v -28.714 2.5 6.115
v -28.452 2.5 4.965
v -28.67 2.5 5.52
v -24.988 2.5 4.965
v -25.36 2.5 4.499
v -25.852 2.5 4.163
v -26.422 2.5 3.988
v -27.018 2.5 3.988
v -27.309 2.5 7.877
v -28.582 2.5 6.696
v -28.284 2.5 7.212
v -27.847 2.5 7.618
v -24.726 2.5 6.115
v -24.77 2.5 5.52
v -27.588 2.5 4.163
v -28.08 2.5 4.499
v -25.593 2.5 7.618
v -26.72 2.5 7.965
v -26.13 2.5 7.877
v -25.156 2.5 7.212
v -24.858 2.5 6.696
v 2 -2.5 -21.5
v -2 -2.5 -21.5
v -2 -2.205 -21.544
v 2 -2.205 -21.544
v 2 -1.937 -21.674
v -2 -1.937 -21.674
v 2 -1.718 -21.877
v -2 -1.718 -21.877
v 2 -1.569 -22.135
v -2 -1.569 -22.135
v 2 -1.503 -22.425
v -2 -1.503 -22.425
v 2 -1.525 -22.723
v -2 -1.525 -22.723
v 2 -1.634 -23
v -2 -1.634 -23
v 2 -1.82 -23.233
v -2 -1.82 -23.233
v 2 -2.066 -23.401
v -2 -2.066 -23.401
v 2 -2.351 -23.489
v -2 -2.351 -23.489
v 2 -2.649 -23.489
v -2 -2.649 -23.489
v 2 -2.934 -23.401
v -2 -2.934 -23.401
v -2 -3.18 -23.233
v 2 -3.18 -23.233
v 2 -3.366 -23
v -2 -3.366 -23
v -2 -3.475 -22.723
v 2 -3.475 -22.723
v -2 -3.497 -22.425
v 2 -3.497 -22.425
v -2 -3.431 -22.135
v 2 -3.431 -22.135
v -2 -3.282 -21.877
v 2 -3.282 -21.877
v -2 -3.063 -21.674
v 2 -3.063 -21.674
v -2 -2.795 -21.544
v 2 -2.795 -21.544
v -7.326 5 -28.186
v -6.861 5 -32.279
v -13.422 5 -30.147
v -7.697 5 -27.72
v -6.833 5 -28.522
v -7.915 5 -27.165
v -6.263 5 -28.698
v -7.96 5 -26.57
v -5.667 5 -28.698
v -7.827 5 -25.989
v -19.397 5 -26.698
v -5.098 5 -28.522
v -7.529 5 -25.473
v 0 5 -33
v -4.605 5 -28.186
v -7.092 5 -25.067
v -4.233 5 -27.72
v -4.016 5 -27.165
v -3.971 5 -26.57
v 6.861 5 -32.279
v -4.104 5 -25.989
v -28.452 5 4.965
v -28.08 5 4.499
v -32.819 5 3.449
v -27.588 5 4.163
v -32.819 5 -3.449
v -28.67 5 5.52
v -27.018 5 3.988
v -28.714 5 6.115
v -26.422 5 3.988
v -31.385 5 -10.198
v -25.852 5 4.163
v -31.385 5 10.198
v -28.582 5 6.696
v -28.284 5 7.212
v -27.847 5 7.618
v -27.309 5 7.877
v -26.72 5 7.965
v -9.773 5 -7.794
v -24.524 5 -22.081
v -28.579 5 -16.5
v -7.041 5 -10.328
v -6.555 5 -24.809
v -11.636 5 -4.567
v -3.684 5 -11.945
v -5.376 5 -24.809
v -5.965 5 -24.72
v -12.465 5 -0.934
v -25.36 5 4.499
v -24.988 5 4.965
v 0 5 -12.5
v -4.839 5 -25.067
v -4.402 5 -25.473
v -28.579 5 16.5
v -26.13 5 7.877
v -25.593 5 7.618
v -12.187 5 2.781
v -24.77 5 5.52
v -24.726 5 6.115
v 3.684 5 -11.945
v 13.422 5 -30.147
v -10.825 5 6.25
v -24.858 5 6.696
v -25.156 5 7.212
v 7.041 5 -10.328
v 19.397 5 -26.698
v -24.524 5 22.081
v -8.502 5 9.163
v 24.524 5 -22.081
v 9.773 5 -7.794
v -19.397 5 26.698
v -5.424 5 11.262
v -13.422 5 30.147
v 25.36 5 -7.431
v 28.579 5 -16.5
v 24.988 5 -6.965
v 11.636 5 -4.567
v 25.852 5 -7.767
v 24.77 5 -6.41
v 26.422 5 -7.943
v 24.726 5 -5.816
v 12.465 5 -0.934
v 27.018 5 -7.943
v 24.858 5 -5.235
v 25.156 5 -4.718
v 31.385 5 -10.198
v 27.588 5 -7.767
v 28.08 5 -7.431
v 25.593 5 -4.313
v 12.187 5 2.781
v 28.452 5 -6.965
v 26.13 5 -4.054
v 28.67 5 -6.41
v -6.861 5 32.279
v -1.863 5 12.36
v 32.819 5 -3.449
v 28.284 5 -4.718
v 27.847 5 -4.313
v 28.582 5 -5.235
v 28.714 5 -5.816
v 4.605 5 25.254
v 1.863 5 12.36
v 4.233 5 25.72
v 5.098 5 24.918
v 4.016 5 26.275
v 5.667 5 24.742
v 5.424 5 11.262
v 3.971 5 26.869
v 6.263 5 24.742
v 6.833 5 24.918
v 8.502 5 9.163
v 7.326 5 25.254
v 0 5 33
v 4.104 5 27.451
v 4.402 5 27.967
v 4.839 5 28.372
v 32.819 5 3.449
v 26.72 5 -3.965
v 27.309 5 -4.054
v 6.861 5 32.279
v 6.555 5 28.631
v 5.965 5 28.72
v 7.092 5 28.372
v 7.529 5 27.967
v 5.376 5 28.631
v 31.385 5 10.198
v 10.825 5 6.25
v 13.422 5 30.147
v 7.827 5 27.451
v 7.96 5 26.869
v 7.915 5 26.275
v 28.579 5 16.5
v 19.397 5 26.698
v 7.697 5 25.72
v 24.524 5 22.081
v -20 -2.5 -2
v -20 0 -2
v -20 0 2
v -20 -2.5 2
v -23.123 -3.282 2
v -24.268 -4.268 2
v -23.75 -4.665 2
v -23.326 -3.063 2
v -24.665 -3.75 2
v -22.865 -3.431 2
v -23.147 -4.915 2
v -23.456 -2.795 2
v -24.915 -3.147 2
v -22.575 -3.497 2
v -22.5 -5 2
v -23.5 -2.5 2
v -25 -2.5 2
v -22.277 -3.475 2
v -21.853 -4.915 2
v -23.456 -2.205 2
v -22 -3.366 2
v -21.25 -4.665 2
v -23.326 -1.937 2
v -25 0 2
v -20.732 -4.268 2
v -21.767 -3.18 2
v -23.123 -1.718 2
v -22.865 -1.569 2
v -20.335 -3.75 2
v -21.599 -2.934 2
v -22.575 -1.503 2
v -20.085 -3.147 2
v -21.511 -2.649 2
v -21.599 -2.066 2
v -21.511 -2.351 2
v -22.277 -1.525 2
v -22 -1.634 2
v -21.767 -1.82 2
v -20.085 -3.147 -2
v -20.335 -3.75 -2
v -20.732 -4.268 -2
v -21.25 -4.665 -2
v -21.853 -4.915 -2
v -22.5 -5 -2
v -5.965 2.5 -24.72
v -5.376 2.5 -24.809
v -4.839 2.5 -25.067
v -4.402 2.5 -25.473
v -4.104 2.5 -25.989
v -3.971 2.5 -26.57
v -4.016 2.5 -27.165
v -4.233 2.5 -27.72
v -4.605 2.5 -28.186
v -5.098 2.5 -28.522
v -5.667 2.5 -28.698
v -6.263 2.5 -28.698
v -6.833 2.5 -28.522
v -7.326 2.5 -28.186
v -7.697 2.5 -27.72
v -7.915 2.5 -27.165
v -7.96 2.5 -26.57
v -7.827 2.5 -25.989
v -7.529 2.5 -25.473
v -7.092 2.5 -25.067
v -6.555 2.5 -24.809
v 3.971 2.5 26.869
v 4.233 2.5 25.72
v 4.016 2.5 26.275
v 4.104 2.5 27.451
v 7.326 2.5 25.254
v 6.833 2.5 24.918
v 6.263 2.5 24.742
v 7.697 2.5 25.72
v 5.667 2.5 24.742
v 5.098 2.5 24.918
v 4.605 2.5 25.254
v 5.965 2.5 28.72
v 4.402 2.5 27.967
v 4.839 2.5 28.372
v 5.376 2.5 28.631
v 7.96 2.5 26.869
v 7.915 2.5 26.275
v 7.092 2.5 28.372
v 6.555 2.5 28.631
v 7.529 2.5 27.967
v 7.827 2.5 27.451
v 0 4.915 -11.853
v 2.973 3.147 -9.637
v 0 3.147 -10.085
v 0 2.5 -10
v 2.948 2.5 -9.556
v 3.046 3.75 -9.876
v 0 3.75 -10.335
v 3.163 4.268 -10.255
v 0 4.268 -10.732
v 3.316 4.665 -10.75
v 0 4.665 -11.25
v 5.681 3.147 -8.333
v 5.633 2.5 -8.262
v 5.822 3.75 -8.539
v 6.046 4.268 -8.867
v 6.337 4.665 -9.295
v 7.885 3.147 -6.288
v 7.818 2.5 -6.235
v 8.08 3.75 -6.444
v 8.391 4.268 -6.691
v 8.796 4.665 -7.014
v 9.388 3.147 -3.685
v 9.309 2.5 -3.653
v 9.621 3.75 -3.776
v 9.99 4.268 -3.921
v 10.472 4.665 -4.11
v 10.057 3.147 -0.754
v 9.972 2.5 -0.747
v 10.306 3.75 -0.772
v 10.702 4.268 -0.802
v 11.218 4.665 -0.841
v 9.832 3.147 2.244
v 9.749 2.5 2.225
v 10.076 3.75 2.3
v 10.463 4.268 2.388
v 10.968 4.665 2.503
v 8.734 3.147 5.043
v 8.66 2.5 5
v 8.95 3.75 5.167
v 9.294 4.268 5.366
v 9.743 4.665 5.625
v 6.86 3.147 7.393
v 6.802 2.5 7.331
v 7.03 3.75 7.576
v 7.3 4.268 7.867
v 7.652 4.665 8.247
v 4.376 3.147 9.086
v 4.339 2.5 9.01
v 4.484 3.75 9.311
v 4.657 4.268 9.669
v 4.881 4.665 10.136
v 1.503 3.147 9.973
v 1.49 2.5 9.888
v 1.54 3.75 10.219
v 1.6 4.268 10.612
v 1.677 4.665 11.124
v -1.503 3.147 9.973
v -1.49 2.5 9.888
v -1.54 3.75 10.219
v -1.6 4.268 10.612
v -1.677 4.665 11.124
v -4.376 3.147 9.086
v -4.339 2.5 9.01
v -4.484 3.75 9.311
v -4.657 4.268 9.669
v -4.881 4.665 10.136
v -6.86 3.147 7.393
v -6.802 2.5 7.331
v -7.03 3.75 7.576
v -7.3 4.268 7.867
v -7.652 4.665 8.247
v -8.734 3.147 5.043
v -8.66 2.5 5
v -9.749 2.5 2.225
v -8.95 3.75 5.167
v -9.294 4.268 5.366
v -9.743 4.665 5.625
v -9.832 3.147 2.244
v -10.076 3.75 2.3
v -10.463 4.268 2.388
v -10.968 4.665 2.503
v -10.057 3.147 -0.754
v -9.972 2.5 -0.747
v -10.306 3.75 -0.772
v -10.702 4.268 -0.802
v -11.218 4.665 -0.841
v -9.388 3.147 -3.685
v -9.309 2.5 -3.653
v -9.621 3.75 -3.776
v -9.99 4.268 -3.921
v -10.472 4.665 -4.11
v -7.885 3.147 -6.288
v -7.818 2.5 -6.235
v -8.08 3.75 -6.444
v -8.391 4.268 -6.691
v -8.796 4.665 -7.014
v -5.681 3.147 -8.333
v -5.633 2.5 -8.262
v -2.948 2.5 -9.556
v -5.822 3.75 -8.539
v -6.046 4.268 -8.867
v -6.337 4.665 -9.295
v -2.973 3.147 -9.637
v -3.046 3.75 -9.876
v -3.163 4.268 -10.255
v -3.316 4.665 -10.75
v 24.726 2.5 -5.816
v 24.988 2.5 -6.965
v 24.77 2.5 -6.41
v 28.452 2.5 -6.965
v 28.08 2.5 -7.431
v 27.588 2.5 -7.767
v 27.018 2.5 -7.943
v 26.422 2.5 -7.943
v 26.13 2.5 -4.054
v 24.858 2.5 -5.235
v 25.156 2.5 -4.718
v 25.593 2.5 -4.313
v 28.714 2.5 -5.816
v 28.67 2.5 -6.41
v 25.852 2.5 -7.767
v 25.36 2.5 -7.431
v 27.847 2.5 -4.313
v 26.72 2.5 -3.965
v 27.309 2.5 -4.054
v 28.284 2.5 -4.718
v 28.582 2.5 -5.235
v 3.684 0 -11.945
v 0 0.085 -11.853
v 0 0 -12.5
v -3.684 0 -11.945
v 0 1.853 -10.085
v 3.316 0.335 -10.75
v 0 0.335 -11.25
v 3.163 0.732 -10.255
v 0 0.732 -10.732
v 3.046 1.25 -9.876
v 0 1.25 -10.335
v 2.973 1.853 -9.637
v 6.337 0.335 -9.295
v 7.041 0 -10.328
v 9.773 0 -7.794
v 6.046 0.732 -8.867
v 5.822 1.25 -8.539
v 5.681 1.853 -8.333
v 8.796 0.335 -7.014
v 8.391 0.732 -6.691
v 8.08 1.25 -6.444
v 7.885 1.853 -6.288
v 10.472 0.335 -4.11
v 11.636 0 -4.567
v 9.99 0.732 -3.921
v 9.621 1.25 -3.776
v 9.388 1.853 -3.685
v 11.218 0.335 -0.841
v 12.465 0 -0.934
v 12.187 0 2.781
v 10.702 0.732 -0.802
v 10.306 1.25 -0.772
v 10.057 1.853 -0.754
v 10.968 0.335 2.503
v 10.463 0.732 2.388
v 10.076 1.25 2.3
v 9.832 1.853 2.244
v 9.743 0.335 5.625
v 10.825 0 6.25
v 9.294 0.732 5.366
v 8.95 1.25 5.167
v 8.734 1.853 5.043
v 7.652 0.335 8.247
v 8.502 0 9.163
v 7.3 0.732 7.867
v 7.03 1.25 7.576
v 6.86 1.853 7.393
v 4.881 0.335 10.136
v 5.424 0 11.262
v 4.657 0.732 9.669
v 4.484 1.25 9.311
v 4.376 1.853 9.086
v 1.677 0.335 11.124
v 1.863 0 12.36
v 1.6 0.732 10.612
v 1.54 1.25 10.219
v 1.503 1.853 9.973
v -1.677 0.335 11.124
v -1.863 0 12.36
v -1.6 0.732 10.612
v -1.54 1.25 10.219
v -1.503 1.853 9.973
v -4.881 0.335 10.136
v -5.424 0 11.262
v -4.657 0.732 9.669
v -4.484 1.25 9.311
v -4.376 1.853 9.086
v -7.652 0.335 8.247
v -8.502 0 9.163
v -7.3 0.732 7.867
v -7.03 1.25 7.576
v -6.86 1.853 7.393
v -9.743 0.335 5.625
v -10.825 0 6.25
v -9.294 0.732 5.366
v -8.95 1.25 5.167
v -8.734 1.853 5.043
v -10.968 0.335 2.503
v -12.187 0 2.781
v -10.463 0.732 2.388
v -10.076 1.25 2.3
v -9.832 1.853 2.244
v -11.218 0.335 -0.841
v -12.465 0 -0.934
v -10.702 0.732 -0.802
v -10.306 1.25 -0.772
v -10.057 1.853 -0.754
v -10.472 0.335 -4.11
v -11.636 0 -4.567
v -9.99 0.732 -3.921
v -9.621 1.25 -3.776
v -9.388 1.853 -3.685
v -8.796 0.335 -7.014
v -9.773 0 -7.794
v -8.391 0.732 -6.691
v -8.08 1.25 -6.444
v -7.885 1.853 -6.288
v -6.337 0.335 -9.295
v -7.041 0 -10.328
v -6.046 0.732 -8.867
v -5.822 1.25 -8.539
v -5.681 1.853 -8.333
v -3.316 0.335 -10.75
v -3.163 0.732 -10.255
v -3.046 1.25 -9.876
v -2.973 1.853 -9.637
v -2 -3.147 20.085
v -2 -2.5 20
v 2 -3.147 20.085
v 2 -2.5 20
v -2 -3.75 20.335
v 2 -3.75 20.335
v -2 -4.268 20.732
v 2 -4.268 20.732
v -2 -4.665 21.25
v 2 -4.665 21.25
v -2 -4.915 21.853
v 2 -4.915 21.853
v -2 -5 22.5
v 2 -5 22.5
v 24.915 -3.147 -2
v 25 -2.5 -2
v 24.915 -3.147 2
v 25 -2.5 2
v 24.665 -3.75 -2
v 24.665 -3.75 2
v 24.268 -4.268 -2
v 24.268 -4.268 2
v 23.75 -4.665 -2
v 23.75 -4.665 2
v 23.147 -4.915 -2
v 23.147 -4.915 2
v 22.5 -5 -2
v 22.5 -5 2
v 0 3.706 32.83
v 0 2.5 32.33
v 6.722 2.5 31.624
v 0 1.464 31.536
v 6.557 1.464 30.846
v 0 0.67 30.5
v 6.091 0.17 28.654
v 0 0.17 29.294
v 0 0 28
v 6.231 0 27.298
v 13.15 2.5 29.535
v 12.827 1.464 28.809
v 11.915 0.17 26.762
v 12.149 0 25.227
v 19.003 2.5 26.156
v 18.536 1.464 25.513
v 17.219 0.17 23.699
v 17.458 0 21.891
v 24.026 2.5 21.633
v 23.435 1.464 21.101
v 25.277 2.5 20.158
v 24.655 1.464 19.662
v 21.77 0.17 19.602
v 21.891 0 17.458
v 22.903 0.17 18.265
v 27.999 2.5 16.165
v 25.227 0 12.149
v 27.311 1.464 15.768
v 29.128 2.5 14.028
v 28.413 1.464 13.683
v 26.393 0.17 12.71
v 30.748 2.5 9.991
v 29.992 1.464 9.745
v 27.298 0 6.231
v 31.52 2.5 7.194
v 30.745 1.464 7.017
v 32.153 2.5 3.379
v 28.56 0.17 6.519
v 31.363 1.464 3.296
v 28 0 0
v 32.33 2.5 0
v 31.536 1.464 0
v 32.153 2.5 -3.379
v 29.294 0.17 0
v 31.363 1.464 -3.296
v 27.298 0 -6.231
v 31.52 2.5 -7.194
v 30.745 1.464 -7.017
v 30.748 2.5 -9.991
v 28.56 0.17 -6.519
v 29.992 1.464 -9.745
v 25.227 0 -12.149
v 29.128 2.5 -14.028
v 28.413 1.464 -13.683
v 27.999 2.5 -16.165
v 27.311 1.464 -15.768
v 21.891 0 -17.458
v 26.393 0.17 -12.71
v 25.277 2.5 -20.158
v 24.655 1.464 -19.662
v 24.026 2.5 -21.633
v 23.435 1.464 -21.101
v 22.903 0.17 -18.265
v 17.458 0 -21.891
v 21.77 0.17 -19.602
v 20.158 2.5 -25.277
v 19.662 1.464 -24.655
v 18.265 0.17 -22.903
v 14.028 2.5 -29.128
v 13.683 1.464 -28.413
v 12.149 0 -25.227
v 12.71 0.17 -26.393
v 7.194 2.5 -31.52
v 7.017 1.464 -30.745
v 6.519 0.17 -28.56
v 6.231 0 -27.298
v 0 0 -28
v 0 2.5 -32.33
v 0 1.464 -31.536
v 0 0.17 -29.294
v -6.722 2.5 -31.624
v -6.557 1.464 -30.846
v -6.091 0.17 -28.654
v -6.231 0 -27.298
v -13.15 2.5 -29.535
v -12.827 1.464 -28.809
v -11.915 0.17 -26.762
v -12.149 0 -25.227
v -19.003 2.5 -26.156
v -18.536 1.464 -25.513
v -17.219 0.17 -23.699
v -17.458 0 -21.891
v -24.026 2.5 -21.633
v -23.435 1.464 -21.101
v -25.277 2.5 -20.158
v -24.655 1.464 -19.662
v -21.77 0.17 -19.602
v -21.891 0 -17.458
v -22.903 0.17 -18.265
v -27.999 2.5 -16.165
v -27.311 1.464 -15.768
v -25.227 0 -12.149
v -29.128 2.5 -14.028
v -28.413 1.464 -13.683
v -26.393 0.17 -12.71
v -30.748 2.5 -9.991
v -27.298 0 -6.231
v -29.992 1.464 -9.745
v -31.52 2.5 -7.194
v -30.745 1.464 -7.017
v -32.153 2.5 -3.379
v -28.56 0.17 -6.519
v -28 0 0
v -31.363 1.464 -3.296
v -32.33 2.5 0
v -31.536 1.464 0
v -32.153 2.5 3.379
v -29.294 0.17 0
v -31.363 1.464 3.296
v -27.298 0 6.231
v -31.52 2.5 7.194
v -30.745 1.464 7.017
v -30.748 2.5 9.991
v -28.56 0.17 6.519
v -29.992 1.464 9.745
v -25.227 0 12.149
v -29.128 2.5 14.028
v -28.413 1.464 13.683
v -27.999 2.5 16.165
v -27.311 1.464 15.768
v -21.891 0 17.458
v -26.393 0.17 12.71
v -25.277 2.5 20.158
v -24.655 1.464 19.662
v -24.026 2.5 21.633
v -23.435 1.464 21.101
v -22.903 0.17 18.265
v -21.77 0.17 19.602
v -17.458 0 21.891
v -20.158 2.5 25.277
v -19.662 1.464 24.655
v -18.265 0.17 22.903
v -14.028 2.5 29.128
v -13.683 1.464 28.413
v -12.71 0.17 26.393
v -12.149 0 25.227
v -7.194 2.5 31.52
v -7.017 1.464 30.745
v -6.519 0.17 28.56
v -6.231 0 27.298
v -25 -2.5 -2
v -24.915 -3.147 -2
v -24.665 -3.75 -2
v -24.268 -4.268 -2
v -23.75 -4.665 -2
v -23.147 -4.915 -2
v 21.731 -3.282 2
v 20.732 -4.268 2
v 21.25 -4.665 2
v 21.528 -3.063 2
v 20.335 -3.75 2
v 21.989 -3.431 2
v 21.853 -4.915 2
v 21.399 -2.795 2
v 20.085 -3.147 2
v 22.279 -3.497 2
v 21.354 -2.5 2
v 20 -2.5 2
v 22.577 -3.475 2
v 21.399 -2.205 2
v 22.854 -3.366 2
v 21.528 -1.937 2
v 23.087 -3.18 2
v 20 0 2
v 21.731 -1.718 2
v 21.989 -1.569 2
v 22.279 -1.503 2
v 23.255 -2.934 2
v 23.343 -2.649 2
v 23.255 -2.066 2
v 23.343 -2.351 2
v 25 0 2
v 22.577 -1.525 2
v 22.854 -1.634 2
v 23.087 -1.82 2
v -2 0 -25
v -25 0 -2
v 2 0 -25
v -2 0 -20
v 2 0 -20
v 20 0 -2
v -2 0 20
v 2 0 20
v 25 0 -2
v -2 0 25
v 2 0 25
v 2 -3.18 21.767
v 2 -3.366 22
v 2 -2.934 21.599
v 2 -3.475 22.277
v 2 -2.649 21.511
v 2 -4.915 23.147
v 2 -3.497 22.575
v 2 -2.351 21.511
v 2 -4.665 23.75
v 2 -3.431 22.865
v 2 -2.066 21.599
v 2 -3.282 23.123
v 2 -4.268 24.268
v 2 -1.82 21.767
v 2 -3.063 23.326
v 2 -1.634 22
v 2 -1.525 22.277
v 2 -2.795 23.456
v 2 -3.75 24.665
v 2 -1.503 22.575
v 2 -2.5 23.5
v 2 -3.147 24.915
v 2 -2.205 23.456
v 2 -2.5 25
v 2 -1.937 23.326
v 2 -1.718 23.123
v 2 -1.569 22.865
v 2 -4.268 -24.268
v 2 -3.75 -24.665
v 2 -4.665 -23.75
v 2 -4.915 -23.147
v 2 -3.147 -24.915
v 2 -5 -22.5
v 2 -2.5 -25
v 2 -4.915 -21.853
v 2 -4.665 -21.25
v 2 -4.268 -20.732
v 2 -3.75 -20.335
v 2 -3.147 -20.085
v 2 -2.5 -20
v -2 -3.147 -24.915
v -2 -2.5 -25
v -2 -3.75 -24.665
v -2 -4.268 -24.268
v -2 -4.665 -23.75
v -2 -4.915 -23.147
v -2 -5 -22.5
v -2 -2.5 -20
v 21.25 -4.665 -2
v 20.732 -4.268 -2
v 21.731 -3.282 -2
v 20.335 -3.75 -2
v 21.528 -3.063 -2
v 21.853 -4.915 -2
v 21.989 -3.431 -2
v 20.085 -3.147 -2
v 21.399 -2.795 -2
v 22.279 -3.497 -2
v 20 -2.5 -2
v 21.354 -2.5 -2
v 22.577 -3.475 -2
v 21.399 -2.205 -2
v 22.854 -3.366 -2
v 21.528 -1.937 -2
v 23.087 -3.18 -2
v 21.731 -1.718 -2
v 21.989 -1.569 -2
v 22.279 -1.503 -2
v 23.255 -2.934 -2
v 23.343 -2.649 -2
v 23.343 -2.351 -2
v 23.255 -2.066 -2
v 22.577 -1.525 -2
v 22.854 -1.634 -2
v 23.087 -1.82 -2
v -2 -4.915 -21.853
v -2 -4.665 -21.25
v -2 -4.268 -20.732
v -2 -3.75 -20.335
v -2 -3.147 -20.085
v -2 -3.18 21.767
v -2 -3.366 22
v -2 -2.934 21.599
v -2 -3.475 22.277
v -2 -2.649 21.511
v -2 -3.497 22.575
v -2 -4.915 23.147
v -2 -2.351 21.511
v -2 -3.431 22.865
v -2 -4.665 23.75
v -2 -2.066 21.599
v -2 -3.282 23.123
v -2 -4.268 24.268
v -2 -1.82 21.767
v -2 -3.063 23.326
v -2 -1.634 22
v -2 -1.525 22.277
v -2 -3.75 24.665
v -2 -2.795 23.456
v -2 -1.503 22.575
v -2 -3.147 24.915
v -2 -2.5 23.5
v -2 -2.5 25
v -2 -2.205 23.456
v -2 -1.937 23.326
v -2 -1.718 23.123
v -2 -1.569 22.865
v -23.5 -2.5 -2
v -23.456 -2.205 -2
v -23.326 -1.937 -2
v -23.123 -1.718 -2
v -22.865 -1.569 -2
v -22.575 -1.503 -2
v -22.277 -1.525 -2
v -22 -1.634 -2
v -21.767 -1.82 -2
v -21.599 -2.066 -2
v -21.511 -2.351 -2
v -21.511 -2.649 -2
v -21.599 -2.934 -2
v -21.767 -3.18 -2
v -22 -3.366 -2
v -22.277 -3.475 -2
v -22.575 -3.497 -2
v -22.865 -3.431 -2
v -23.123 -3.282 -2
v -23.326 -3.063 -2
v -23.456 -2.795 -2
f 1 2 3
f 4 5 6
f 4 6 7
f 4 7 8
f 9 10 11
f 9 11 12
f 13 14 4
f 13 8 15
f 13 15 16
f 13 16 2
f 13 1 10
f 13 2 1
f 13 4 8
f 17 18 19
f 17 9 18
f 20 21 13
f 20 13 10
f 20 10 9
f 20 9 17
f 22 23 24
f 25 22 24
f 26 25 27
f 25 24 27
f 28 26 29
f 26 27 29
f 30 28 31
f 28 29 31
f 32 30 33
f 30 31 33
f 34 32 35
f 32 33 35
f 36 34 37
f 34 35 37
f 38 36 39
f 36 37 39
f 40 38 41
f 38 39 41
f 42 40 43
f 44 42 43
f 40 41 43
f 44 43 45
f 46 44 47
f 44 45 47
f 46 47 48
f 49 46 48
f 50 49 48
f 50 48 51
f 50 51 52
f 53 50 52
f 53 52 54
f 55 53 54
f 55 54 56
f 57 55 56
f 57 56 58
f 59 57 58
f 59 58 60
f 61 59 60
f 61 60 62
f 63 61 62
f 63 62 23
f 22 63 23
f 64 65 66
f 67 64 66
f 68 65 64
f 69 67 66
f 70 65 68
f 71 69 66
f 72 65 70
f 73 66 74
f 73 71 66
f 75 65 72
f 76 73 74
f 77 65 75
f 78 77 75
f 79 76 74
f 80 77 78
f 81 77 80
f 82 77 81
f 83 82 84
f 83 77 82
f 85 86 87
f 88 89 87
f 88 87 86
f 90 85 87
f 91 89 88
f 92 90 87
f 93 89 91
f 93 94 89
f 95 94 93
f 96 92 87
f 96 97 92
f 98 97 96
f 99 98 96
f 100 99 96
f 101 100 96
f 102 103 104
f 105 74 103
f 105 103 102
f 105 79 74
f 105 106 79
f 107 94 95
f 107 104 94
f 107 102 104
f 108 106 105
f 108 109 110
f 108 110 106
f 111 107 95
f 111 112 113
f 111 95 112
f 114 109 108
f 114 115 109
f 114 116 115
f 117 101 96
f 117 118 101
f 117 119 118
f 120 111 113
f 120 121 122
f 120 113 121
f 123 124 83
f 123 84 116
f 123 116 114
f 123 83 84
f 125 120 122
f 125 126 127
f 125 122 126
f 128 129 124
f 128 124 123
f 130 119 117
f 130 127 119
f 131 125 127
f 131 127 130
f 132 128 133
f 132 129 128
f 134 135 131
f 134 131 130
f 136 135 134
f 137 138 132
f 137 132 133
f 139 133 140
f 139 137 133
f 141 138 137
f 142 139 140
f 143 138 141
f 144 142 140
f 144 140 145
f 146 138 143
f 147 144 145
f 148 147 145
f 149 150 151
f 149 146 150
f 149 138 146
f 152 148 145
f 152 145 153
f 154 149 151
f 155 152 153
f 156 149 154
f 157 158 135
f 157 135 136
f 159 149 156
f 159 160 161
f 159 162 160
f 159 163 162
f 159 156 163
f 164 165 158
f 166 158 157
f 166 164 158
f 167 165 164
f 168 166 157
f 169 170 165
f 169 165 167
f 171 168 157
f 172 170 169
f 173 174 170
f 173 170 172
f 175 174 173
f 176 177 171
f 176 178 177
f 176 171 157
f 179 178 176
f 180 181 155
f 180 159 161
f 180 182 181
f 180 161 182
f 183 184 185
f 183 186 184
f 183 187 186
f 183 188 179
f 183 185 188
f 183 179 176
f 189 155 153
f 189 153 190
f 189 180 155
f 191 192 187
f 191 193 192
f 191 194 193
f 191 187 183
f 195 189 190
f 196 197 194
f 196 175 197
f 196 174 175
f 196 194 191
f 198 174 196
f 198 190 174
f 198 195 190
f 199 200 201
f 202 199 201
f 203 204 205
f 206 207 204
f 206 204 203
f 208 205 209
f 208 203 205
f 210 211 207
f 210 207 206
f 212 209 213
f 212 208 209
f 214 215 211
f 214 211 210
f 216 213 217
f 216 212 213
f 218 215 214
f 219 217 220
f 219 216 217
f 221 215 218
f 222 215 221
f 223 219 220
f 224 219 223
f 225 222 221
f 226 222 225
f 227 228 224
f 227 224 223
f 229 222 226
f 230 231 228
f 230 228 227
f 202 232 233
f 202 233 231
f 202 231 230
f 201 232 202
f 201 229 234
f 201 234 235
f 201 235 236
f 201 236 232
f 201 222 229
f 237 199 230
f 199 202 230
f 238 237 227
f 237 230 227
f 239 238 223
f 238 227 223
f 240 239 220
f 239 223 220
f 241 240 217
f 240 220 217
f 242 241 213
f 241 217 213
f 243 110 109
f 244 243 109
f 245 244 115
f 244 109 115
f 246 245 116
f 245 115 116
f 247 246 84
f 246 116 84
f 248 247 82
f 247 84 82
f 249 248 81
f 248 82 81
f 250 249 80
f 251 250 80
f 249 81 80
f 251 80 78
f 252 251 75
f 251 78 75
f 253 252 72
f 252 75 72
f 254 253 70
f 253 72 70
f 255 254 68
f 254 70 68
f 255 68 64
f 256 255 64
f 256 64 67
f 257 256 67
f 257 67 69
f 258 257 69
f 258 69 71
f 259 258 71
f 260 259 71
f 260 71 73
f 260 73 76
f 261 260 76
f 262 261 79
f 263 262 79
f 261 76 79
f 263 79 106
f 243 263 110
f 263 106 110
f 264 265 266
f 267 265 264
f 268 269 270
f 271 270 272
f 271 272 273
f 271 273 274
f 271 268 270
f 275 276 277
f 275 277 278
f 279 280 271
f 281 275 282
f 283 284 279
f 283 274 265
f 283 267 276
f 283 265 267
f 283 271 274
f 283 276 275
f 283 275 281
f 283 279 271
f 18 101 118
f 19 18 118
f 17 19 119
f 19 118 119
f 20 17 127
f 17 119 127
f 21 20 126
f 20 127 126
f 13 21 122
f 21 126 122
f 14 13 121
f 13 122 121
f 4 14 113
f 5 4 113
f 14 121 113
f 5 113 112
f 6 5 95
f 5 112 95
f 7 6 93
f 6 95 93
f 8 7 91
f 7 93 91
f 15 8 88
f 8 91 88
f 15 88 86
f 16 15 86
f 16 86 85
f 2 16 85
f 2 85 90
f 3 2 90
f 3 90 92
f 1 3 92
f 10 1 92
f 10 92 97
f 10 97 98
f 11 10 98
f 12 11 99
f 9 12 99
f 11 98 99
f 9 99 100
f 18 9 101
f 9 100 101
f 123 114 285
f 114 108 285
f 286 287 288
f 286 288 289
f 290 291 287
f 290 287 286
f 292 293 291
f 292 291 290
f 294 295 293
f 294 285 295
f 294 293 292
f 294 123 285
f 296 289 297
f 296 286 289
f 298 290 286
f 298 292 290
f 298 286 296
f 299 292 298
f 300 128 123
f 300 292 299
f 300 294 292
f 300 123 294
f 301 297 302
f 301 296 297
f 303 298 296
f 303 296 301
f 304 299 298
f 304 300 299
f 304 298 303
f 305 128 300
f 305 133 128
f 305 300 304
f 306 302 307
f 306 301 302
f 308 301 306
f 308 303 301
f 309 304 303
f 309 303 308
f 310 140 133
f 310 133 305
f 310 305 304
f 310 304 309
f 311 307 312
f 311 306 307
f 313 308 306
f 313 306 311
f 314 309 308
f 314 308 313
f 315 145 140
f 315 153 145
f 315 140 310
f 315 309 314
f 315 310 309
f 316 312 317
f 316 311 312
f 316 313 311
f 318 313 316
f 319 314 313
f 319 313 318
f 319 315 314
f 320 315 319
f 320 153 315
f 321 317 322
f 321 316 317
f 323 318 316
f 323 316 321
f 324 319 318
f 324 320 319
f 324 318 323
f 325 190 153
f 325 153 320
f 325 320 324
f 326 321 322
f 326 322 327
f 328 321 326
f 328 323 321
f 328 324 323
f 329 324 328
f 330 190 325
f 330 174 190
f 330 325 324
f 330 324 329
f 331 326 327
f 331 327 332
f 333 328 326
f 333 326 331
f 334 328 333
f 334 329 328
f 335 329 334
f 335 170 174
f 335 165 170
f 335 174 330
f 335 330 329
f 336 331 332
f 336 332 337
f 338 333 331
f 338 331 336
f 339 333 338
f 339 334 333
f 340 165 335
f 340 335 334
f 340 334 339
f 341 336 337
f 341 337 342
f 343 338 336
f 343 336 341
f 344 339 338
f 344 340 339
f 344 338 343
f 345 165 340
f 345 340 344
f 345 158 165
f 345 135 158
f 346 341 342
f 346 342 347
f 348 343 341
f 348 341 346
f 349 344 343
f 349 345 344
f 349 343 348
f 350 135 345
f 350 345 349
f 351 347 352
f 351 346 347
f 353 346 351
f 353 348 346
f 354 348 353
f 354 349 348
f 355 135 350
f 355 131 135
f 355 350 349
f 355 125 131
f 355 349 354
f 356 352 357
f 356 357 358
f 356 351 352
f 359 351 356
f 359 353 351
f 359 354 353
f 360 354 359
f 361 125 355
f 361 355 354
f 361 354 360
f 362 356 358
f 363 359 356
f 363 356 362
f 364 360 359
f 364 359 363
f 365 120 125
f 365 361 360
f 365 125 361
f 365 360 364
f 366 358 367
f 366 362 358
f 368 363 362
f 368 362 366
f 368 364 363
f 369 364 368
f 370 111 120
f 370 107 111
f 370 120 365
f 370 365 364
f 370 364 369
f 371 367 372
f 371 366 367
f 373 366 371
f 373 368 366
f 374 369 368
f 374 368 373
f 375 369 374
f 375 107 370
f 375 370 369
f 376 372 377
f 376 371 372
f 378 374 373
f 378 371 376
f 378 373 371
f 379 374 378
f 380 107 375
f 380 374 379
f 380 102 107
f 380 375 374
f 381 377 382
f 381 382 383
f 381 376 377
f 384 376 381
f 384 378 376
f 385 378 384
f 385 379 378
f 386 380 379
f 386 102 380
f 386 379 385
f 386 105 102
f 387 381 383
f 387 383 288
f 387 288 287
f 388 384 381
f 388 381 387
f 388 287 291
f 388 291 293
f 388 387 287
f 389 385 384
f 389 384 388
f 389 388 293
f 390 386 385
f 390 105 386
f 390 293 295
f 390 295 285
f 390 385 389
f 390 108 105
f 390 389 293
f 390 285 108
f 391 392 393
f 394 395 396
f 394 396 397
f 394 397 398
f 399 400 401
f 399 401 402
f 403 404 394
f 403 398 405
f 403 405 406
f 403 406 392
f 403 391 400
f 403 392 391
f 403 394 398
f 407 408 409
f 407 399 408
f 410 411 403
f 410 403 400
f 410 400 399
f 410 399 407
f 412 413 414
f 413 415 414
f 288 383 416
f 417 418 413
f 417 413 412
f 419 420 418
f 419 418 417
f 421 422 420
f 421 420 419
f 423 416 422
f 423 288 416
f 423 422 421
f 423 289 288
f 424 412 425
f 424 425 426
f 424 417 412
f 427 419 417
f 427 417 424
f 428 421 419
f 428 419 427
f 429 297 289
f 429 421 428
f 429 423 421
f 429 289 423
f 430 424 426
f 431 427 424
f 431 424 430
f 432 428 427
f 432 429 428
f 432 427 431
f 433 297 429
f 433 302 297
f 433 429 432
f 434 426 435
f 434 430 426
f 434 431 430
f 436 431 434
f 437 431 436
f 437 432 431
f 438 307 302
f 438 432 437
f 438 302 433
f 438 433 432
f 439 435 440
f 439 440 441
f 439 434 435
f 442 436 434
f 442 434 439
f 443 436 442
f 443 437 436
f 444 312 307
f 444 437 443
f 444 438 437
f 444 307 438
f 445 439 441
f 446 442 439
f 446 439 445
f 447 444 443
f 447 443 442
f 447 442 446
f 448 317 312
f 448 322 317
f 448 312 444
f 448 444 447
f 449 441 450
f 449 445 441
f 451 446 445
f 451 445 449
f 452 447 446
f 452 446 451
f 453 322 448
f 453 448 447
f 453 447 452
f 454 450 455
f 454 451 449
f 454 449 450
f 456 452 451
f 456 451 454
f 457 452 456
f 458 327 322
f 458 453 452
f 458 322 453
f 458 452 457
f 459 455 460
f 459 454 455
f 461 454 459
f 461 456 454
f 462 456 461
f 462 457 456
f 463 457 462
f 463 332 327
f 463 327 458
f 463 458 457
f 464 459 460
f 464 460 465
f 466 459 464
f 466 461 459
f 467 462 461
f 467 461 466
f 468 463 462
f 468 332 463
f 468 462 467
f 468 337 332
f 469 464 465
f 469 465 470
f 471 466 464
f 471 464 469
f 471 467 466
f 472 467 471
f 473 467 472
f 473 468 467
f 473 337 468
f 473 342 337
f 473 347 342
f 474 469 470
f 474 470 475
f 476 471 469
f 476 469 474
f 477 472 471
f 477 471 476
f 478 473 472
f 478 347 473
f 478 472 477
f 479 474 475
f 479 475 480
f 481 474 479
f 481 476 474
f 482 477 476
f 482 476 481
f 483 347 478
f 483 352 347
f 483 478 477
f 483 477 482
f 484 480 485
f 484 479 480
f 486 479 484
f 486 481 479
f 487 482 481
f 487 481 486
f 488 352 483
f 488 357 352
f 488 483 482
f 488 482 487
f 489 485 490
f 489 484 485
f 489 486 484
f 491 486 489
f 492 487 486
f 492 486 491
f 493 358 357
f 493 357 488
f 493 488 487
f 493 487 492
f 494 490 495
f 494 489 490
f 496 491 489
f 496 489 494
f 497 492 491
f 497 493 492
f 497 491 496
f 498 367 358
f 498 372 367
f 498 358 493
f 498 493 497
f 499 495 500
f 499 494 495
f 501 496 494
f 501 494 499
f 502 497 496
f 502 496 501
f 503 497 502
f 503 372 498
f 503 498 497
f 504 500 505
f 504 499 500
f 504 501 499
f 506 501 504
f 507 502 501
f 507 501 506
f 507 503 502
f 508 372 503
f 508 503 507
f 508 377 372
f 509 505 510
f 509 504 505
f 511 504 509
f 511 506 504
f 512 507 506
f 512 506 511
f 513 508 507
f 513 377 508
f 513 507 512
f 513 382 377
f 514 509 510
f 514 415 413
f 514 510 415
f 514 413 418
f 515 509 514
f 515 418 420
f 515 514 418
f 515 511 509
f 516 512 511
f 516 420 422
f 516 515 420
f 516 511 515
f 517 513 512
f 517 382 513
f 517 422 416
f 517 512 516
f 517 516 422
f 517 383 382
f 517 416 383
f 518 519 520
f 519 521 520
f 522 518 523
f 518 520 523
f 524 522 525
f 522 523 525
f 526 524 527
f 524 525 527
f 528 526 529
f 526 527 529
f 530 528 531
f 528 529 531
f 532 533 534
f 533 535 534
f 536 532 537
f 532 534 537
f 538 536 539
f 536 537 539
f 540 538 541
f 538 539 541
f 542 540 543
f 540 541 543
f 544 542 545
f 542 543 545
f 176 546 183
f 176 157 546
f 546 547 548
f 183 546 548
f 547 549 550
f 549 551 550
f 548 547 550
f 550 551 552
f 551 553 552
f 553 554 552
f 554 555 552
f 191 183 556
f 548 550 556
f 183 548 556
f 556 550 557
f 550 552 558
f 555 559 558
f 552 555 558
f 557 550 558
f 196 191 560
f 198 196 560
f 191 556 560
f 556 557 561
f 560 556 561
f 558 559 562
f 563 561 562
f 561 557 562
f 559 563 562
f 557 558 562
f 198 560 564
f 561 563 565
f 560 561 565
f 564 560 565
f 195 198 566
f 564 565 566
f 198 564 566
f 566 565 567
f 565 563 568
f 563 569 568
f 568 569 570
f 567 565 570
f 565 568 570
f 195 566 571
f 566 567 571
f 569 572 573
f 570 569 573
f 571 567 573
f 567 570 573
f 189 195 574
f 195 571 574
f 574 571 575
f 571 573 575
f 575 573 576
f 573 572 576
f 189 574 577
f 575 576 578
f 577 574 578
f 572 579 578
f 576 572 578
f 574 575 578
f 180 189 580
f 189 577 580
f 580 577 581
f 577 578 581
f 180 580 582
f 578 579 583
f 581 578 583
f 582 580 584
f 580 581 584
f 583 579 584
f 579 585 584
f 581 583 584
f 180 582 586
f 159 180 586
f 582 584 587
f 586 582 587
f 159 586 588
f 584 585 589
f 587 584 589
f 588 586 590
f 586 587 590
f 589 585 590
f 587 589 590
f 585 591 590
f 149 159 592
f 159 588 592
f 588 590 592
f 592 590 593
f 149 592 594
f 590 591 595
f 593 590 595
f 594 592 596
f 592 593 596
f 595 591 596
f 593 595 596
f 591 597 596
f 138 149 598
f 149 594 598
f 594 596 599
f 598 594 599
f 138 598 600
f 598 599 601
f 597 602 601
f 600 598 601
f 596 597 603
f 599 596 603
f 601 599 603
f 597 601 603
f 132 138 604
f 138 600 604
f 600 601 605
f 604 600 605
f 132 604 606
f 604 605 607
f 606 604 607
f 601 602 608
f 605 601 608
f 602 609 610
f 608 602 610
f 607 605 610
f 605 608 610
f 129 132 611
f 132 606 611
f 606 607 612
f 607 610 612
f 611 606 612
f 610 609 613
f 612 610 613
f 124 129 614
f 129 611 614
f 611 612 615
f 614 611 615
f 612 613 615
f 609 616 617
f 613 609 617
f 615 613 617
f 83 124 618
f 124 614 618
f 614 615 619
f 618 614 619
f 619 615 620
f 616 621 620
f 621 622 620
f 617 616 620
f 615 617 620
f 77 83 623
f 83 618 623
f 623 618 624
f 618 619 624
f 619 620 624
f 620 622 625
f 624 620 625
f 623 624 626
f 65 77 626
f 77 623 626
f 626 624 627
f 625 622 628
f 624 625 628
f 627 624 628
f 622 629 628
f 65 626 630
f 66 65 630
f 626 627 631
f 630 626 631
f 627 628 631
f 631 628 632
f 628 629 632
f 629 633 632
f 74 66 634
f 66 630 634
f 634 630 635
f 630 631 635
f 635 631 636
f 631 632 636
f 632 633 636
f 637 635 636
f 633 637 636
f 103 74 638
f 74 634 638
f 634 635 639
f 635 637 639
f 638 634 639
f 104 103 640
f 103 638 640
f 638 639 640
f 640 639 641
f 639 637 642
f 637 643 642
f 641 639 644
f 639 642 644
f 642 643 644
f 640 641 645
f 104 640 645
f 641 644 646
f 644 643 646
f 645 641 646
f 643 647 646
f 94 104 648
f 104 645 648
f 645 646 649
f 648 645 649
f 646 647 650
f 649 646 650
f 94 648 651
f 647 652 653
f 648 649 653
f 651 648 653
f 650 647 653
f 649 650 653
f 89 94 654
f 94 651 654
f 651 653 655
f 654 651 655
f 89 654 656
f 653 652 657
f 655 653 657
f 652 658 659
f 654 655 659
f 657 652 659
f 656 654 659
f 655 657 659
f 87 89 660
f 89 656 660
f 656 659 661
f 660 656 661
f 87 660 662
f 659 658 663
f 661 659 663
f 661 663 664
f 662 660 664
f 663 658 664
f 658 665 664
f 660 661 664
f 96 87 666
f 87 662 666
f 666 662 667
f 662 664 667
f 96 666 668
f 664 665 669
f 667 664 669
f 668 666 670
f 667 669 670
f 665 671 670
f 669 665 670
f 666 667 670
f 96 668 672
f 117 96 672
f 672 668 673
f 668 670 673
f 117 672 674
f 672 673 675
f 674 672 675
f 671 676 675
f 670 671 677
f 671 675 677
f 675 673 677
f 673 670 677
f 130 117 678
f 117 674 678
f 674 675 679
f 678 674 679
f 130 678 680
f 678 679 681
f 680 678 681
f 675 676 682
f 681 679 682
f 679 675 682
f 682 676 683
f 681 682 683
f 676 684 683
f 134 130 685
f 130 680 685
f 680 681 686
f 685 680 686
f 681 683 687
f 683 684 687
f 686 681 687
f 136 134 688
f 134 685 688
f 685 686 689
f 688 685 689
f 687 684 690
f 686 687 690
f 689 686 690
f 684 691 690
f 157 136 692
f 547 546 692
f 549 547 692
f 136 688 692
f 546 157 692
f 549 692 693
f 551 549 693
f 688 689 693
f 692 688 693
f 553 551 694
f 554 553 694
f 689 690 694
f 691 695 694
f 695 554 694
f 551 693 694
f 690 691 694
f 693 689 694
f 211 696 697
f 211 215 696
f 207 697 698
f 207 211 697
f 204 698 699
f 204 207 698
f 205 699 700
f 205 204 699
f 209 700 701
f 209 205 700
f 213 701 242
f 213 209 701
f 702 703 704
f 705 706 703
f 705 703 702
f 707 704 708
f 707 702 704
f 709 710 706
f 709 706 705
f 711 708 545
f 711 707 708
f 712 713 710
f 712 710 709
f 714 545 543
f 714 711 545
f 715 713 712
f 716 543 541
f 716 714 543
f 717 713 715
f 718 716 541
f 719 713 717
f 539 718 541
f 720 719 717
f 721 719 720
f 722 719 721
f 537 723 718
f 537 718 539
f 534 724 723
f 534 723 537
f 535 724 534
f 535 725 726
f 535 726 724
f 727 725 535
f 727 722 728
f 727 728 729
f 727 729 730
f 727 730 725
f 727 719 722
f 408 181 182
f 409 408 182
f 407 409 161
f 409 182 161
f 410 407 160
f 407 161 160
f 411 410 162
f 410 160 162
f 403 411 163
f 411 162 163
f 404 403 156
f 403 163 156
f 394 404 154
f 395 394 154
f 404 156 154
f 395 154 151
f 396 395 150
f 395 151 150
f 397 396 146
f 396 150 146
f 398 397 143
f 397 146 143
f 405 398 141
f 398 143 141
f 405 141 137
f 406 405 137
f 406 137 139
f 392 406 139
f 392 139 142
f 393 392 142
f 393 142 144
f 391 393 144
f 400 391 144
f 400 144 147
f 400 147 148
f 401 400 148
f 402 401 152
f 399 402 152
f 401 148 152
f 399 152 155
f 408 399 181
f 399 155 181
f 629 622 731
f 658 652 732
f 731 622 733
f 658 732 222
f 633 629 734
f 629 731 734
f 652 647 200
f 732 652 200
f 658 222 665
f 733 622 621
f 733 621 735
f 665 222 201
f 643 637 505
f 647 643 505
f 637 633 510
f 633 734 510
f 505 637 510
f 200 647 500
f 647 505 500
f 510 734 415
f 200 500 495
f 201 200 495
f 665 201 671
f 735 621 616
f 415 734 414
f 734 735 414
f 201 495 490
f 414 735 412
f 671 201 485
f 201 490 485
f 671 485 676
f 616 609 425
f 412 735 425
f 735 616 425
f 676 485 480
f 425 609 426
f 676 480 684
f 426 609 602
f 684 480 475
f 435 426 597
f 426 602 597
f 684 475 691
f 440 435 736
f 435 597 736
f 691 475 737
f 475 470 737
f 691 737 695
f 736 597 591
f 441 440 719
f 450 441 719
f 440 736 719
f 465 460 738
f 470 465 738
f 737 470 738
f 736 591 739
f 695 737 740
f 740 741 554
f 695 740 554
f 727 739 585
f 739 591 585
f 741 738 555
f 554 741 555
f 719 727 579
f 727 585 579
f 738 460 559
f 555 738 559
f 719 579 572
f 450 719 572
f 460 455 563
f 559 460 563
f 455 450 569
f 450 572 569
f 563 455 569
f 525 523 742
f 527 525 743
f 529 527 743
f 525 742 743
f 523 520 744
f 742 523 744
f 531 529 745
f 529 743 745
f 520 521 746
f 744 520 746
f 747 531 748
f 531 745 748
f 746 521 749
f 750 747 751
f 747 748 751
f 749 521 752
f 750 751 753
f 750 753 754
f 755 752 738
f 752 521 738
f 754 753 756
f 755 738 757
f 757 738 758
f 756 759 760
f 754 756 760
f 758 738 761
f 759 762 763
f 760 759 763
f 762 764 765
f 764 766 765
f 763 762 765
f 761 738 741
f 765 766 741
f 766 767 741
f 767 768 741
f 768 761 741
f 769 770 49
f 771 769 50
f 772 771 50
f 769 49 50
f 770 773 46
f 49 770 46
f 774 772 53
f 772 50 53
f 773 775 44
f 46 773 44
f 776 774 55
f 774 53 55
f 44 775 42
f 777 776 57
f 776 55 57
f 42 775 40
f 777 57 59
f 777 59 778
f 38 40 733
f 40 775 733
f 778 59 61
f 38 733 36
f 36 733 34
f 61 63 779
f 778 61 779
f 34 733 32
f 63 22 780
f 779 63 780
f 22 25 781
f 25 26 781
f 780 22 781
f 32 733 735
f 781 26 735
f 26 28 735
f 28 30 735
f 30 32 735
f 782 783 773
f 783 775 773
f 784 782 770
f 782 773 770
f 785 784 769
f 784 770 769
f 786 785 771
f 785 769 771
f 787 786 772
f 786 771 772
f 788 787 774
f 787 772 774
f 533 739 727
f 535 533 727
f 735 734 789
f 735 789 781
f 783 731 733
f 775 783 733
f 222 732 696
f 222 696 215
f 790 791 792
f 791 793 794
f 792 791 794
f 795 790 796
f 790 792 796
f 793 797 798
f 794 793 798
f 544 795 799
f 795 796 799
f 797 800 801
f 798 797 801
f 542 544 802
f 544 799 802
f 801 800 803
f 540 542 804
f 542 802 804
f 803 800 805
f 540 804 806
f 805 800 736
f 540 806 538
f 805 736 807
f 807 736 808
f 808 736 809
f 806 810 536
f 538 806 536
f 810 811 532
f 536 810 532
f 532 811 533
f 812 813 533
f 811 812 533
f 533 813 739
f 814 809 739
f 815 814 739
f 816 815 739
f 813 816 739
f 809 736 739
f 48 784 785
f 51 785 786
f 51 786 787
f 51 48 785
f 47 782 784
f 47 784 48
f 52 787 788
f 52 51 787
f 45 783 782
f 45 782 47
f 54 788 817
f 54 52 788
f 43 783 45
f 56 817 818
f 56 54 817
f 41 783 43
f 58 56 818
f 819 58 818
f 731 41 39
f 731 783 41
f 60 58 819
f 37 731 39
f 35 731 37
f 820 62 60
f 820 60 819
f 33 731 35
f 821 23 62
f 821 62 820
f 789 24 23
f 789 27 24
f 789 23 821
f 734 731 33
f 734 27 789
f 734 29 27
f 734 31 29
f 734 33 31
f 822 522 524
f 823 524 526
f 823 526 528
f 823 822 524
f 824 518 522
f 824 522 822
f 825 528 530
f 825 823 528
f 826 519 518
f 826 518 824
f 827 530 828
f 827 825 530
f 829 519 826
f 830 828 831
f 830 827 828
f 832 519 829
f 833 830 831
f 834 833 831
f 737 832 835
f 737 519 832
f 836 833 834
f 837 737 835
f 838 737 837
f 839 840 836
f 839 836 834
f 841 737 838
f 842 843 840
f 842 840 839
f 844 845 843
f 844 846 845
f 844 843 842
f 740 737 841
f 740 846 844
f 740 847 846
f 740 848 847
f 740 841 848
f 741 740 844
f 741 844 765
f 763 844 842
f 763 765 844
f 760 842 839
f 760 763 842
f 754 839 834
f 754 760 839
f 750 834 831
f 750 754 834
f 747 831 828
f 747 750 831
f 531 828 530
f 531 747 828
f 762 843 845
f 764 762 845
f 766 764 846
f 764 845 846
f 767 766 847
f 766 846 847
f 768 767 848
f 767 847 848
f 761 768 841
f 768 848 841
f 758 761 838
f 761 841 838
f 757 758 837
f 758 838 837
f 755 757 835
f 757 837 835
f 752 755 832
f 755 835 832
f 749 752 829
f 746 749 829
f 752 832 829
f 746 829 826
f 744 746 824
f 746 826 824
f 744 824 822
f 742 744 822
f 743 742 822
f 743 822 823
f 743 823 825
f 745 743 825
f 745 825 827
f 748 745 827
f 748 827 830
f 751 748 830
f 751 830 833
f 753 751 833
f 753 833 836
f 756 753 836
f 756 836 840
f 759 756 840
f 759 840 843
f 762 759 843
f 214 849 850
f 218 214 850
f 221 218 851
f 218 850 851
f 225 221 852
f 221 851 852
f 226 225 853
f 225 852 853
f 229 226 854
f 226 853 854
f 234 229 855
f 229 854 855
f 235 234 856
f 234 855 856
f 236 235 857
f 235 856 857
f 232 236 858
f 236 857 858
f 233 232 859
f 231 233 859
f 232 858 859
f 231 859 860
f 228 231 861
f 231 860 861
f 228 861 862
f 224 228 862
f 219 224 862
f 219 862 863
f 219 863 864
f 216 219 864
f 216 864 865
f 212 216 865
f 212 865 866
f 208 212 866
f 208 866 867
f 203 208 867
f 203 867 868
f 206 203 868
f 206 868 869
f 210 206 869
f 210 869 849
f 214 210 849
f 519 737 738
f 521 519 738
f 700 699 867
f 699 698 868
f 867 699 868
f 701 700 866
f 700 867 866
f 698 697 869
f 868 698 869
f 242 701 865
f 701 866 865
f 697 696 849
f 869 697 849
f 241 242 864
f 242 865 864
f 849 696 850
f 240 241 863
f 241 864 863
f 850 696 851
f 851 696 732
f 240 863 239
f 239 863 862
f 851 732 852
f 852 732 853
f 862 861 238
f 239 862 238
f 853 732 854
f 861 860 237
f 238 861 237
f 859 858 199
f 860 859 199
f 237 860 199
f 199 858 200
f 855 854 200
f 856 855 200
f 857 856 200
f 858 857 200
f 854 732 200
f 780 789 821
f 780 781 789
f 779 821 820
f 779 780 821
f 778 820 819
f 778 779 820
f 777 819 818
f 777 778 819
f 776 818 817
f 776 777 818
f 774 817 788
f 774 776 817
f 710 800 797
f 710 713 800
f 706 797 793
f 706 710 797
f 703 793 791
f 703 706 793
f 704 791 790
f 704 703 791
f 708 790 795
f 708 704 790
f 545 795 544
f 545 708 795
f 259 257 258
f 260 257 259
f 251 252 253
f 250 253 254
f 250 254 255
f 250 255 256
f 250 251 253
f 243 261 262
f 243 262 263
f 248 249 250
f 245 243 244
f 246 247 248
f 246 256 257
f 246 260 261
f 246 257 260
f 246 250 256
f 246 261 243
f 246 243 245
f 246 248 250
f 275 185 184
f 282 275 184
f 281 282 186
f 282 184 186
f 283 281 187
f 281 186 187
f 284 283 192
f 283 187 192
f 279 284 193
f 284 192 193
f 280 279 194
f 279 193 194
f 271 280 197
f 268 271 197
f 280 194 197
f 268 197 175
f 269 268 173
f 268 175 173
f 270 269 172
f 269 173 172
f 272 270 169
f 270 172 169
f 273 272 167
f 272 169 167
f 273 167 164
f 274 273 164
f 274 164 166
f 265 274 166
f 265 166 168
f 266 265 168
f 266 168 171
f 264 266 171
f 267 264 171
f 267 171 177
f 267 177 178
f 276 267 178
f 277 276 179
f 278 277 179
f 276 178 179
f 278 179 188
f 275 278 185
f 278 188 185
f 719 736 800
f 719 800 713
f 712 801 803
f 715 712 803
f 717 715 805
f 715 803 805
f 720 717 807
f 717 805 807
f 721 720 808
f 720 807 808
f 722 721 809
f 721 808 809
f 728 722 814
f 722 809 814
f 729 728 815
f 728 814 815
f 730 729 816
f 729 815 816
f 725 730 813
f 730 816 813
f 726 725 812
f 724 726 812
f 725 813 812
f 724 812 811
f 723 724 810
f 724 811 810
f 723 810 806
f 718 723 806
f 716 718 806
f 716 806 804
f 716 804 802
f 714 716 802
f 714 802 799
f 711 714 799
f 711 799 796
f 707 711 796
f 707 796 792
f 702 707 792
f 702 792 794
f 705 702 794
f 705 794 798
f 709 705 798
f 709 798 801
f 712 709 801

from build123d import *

# Parameters (mm, degrees)
SKETCH1_R           = 33
BOSS_EXTRUDE1_DEPTH = 5
SKETCH2_R           = 2
CUT_EXTRUDE1_DEPTH  = 2.5
FILLET1_R           = 5
SKETCH3_W           = 4
SKETCH3_H           = 5
SKETCH3_W_2         = 5
SKETCH3_H_2         = 4
BOSS_EXTRUDE2_DEPTH = 5
FILLET2_R           = 2.5
SKETCH4_R           = 1
CUT_EXTRUDE2_DEPTH  = 5
SKETCH5_R           = 1
CUT_EXTRUDE3_DEPTH  = 5
SKETCH6_R           = 10
CUT_EXTRUDE4_DEPTH  = 5
FILLET3_R           = 2.5


with BuildPart() as part:
    # Sketch1 → Boss-Extrude1 (new body)
    with BuildSketch(Plane(origin=(0, 0, 0), x_dir=(1, 0, 0), z_dir=(0, 1, 0))):
        with Locations(Location((0, 0, 0), (0, 0, 270))):
            Circle(SKETCH1_R)
    extrude(amount=BOSS_EXTRUDE1_DEPTH)

    # Sketch2 → Cut-Extrude1 (cut)
    with BuildSketch(Plane(origin=(0, 5, 0), x_dir=(1, 0, 0), z_dir=(0, 1, 0))):
        with Locations(Location((-26.719955328, -5.965376271, 0), (0, 0, 270))):
            Circle(SKETCH2_R)
        with Locations(Location((-5.965376271, 26.719955328, 0), (0, 0, 270))):
            Circle(SKETCH2_R)
        with Locations(Location((26.719955328, 5.965376271, 0), (0, 0, 270))):
            Circle(SKETCH2_R)
        with Locations(Location((5.965376271, -26.719955328, 0), (0, 0, 270))):
            Circle(SKETCH2_R)
    extrude(amount=-CUT_EXTRUDE1_DEPTH, mode=Mode.SUBTRACT)

    # Fillet1
    fillet1_edges = [part.edges().sort_by_distance(p)[0] for p in [
        (0, 0, -33),
    ]]
    fillet(fillet1_edges, radius=FILLET1_R - 0.0001)  # a hair under: the kernel refuses the full size

    # Sketch3 → Boss-Extrude2 (add)
    with BuildSketch(Plane.XZ):
        with Locations((0, 22.5)):
            Rectangle(SKETCH3_W, SKETCH3_H)
        with Locations((-22.5, 0)):
            Rectangle(SKETCH3_W_2, SKETCH3_H_2)
        with Locations((22.5, 0)):
            Rectangle(SKETCH3_W_2, SKETCH3_H_2)
        with Locations((0, -22.5)):
            Rectangle(SKETCH3_W, SKETCH3_H)
    extrude(amount=BOSS_EXTRUDE2_DEPTH)

    # Fillet2
    fillet2_edges = [part.edges().sort_by_distance(p)[0] for p in [
        (0, -5, 20),
        (0, -5, 25),
        (25, -5, 0),
        (20, -5, 0),
        (0, -5, -20),
        (0, -5, -25),
        (-25, -5, 0),
        (-20, -5, 0),
    ]]
    fillet(fillet2_edges, radius=FILLET2_R - 0.0001)  # a hair under: the kernel refuses the full size

    # Sketch4 → Cut-Extrude2 (cut)
    with BuildSketch(Plane(origin=(0, 0, -2), x_dir=(-1, 0, 0), z_dir=(0, 0, -1))):
        with Locations((22.5, -2.5)):
            Circle(SKETCH4_R)
        with Locations((-22.354219449, -2.5)):
            Circle(SKETCH4_R)
    extrude(amount=-CUT_EXTRUDE2_DEPTH, mode=Mode.SUBTRACT)

    # Sketch5 → Cut-Extrude3 (cut)
    with BuildSketch(Plane.ZY.offset(2)):
        with Locations((22.5, -2.5)):
            Circle(SKETCH5_R)
        with Locations((-22.5, -2.5)):
            Circle(SKETCH5_R)
    extrude(amount=-CUT_EXTRUDE3_DEPTH, mode=Mode.SUBTRACT)

    # Sketch6 → Cut-Extrude4 (cut)
    with BuildSketch(Plane.XZ):
        with Locations(Location((0, 0, 0), (0, 0, 270))):
            Circle(SKETCH6_R)
    extrude(amount=-CUT_EXTRUDE4_DEPTH, mode=Mode.SUBTRACT)

    # Fillet3
    fillet3_edges = [part.edges().sort_by_distance(p)[0] for p in [
        (0, 5, 10),
        (0, 0, 10),
    ]]
    fillet(fillet3_edges, radius=FILLET3_R - 0.0001)  # a hair under: the kernel refuses the full size


solid = part.part
